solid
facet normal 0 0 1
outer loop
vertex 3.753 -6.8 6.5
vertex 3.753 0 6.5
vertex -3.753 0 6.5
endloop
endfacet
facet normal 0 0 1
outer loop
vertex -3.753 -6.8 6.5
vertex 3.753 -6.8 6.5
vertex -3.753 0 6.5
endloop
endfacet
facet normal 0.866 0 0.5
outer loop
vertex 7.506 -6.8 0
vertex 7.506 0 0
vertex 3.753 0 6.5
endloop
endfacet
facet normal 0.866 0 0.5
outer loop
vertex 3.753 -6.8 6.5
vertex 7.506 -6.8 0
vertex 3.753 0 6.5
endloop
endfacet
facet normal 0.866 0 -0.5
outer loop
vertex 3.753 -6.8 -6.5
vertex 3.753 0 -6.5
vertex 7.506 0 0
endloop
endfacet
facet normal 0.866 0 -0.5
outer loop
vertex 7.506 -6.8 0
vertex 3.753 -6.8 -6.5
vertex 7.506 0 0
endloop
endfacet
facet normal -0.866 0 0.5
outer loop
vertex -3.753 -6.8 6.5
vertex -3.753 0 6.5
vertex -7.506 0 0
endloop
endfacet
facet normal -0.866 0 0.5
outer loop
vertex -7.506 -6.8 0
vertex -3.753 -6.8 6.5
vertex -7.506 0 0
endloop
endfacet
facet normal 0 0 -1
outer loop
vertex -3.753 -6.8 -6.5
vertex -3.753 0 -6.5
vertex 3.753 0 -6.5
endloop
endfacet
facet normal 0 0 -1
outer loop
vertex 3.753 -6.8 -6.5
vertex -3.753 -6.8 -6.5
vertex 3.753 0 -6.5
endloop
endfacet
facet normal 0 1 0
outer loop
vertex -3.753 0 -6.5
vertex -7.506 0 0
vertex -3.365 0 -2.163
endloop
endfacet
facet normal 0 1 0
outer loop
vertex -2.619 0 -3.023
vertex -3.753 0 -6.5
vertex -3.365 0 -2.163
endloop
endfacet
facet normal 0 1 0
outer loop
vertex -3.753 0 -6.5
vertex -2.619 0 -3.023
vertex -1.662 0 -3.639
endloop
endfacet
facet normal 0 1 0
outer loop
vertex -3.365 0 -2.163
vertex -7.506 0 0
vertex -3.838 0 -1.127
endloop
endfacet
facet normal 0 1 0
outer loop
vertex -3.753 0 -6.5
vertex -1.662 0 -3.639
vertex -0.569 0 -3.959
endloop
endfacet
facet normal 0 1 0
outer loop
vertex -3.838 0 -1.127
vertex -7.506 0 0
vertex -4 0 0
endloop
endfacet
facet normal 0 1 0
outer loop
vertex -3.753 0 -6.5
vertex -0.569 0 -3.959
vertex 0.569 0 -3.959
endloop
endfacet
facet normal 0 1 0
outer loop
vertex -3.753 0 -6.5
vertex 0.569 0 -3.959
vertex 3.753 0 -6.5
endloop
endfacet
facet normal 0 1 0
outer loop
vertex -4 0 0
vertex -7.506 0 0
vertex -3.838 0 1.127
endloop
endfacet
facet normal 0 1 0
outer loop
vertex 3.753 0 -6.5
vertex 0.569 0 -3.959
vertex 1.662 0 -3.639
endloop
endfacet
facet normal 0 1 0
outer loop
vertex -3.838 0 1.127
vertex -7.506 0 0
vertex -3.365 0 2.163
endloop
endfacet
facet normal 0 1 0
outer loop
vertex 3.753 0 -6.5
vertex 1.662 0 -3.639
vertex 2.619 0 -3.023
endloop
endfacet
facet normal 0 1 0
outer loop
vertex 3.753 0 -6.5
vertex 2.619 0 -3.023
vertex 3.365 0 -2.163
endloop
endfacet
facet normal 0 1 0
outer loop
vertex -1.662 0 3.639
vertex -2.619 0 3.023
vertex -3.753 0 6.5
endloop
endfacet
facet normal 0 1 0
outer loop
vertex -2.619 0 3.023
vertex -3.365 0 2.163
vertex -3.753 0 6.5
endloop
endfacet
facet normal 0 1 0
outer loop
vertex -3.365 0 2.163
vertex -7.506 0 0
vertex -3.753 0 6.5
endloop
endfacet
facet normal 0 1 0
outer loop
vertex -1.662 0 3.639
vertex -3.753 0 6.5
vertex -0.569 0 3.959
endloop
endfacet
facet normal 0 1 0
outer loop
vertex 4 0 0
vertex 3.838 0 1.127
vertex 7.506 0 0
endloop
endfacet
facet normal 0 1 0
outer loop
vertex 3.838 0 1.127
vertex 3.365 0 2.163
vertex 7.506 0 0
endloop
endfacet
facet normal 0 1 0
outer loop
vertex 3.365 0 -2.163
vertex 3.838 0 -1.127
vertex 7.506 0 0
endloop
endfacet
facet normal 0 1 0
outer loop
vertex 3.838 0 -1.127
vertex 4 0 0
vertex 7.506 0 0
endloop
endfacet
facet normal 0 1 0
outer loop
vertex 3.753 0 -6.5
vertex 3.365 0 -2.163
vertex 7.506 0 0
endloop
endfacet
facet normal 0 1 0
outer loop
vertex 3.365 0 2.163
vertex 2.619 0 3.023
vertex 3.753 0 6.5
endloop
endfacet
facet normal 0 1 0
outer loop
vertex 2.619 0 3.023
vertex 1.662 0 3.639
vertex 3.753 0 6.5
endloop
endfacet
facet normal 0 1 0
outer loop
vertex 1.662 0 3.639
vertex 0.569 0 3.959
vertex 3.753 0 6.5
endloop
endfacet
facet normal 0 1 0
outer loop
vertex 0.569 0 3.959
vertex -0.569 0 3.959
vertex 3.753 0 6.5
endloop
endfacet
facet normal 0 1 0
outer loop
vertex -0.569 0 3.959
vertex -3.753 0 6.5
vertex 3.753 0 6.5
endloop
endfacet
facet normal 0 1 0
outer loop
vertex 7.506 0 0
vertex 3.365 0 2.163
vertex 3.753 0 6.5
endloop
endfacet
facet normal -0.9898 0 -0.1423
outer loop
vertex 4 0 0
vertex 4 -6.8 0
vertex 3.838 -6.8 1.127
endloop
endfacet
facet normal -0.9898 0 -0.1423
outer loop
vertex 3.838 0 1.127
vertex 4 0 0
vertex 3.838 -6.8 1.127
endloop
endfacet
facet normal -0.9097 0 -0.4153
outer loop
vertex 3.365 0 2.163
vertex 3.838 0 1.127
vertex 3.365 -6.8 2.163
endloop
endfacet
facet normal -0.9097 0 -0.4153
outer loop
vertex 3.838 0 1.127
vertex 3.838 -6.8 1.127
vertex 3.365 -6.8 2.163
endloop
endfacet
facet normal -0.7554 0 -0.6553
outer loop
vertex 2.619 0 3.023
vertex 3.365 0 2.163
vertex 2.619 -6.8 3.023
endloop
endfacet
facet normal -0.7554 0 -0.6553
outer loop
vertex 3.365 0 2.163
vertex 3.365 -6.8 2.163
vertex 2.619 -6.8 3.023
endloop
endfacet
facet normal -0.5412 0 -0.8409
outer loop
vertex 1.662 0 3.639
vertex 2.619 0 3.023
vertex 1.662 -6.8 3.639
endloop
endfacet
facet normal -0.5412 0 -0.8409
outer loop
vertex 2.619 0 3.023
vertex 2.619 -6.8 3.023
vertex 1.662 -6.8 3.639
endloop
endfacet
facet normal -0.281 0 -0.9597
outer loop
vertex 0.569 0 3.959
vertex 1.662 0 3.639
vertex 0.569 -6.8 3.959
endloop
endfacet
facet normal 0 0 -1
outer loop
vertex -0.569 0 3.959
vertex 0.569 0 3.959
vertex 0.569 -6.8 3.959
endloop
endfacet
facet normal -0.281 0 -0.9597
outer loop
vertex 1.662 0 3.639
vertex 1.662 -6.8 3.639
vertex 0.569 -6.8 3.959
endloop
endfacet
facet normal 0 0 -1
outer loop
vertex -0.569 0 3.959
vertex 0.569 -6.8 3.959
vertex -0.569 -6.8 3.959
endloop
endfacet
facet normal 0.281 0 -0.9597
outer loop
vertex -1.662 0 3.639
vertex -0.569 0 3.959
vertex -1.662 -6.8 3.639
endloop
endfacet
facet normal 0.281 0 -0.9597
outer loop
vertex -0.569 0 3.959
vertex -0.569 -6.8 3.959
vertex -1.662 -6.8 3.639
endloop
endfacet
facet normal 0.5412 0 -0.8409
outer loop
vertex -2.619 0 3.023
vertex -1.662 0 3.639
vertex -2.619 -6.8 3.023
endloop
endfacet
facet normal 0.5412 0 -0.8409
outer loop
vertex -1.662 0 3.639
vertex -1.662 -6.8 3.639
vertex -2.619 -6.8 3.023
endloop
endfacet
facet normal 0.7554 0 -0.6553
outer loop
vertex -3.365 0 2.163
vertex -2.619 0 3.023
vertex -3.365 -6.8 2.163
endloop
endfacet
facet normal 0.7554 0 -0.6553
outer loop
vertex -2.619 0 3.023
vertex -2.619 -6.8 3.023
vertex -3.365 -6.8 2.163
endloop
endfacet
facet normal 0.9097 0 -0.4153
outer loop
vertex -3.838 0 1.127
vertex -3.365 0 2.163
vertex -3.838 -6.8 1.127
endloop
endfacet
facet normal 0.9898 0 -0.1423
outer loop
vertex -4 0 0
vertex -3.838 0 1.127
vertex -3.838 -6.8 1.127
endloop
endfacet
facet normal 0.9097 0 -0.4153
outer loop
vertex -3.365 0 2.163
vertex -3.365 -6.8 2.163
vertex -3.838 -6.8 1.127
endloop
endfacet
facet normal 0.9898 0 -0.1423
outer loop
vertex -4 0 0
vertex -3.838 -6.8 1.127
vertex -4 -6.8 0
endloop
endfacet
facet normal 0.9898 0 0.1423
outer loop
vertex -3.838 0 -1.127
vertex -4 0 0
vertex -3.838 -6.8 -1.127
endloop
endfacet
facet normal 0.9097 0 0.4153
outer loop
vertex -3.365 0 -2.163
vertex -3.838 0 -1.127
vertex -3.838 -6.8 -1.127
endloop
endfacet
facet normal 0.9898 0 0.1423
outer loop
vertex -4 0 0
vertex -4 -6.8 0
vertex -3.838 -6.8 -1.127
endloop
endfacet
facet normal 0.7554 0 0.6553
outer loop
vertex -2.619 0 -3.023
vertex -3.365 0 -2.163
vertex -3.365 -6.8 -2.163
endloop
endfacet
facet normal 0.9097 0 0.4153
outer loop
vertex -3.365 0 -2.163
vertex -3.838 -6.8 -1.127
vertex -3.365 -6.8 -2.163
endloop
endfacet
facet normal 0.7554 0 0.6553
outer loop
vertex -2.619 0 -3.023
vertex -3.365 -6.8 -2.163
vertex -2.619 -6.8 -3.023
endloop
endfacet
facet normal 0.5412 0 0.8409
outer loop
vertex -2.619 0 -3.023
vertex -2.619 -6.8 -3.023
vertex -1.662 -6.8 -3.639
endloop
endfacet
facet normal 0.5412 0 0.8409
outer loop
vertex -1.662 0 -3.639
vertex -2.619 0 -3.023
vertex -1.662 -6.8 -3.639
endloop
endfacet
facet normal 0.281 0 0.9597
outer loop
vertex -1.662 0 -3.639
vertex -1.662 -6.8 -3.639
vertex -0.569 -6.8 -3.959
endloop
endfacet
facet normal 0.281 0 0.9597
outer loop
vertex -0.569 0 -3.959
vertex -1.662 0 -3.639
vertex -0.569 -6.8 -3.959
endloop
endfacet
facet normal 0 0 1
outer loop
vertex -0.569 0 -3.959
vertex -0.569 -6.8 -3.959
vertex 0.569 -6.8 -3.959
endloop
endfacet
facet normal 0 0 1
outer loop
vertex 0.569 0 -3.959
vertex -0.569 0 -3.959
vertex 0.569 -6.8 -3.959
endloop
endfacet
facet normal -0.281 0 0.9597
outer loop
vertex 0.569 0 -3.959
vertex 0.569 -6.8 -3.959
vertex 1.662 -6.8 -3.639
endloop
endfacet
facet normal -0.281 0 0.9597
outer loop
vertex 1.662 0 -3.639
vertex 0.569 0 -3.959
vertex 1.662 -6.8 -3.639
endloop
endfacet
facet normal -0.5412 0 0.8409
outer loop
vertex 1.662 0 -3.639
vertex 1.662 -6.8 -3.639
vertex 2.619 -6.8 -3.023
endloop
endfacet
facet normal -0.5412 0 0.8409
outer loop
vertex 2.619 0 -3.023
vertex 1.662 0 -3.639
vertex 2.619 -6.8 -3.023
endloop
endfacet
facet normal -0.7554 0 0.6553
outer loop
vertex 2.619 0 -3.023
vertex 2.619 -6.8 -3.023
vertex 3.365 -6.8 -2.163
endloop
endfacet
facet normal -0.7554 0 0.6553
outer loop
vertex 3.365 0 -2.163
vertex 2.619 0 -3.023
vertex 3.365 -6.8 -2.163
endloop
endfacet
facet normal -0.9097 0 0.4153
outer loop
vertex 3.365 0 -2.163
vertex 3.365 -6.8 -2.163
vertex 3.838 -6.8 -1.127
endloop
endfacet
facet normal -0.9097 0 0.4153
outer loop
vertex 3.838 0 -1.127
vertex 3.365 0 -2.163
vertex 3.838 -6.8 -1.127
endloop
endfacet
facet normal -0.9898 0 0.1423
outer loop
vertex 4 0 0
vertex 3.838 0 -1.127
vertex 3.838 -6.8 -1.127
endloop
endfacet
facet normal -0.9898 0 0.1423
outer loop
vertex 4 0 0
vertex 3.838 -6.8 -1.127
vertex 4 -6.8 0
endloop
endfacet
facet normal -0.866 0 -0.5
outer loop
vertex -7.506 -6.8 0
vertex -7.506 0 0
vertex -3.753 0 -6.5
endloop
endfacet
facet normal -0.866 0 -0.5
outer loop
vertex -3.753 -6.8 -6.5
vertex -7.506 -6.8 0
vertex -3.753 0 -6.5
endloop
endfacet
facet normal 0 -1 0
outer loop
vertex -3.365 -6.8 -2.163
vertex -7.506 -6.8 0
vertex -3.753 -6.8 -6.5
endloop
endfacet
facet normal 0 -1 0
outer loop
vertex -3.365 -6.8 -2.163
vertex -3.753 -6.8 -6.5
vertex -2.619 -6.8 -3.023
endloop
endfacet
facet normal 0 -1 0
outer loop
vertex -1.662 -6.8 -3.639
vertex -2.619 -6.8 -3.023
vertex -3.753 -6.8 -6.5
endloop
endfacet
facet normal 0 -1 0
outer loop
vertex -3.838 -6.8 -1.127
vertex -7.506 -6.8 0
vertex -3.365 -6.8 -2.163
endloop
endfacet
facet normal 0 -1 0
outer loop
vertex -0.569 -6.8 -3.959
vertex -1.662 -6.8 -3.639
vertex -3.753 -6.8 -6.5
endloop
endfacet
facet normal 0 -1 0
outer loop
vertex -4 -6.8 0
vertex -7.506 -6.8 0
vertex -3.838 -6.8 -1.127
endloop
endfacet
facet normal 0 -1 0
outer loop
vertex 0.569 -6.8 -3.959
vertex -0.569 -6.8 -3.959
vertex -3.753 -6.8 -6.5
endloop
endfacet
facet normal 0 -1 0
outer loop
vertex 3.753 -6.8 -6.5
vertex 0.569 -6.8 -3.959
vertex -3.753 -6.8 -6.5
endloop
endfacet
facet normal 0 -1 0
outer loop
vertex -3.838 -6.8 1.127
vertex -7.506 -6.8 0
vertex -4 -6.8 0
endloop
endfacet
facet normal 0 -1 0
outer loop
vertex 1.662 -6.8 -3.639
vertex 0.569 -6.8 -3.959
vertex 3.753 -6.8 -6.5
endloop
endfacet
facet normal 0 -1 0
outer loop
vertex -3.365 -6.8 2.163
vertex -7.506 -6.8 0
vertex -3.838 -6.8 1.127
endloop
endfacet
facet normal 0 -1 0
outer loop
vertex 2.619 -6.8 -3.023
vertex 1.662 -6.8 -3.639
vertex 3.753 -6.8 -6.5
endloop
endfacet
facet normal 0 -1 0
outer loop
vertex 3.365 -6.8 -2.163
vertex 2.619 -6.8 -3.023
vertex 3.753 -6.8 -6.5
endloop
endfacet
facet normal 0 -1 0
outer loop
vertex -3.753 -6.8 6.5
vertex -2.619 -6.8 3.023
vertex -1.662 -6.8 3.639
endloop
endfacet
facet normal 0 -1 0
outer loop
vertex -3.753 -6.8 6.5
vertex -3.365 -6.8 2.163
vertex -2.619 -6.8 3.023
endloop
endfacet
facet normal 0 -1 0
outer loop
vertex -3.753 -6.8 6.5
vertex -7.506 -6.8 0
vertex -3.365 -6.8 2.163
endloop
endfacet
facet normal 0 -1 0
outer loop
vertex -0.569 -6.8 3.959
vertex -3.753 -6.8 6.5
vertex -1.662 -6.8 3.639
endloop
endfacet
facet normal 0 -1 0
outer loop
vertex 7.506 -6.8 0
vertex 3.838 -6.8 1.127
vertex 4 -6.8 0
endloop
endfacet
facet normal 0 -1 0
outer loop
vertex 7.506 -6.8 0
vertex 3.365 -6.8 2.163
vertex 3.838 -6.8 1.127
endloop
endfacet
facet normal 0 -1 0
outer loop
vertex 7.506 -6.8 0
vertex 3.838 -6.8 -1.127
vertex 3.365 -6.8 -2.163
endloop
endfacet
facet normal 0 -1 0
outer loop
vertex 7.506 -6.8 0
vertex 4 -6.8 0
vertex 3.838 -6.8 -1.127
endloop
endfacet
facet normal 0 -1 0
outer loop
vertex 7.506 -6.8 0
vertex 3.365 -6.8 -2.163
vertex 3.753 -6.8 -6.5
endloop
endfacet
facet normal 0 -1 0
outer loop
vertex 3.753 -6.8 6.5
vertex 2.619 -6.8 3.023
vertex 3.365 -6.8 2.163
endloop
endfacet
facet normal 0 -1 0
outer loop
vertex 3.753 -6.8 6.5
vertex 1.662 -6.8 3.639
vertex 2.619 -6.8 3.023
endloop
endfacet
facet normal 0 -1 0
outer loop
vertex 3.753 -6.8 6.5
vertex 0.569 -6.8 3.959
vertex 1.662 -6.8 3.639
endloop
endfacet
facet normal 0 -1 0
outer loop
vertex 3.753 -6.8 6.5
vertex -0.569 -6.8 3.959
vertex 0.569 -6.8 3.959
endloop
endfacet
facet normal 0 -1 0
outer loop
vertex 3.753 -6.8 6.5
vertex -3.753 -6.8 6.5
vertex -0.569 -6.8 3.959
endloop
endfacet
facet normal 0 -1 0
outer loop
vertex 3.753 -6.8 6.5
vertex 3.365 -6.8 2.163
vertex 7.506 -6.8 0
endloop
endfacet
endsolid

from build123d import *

# Parameters (mm, degrees)
F1_DEPTH = 6.8
F2_R     = 4
F3_DEPTH = 6.801


with BuildPart() as f1:
    # F0 (on Front) → F1 (new body)
    with BuildSketch(Plane.XZ):
        Polygon((3.752777, -6.5), (7.505553, 0), (3.752777, 6.5), (-3.752777, 6.5), (-7.505553, 0), (-3.752777, -6.5), align=None)
    extrude(amount=F1_DEPTH)

    # F2 (on face) → F3 (cut, through all)
    with BuildSketch(Plane.XZ.offset(6.8)):
        Circle(F2_R)
    extrude(amount=-F3_DEPTH, mode=Mode.SUBTRACT)


solid = f1.part
